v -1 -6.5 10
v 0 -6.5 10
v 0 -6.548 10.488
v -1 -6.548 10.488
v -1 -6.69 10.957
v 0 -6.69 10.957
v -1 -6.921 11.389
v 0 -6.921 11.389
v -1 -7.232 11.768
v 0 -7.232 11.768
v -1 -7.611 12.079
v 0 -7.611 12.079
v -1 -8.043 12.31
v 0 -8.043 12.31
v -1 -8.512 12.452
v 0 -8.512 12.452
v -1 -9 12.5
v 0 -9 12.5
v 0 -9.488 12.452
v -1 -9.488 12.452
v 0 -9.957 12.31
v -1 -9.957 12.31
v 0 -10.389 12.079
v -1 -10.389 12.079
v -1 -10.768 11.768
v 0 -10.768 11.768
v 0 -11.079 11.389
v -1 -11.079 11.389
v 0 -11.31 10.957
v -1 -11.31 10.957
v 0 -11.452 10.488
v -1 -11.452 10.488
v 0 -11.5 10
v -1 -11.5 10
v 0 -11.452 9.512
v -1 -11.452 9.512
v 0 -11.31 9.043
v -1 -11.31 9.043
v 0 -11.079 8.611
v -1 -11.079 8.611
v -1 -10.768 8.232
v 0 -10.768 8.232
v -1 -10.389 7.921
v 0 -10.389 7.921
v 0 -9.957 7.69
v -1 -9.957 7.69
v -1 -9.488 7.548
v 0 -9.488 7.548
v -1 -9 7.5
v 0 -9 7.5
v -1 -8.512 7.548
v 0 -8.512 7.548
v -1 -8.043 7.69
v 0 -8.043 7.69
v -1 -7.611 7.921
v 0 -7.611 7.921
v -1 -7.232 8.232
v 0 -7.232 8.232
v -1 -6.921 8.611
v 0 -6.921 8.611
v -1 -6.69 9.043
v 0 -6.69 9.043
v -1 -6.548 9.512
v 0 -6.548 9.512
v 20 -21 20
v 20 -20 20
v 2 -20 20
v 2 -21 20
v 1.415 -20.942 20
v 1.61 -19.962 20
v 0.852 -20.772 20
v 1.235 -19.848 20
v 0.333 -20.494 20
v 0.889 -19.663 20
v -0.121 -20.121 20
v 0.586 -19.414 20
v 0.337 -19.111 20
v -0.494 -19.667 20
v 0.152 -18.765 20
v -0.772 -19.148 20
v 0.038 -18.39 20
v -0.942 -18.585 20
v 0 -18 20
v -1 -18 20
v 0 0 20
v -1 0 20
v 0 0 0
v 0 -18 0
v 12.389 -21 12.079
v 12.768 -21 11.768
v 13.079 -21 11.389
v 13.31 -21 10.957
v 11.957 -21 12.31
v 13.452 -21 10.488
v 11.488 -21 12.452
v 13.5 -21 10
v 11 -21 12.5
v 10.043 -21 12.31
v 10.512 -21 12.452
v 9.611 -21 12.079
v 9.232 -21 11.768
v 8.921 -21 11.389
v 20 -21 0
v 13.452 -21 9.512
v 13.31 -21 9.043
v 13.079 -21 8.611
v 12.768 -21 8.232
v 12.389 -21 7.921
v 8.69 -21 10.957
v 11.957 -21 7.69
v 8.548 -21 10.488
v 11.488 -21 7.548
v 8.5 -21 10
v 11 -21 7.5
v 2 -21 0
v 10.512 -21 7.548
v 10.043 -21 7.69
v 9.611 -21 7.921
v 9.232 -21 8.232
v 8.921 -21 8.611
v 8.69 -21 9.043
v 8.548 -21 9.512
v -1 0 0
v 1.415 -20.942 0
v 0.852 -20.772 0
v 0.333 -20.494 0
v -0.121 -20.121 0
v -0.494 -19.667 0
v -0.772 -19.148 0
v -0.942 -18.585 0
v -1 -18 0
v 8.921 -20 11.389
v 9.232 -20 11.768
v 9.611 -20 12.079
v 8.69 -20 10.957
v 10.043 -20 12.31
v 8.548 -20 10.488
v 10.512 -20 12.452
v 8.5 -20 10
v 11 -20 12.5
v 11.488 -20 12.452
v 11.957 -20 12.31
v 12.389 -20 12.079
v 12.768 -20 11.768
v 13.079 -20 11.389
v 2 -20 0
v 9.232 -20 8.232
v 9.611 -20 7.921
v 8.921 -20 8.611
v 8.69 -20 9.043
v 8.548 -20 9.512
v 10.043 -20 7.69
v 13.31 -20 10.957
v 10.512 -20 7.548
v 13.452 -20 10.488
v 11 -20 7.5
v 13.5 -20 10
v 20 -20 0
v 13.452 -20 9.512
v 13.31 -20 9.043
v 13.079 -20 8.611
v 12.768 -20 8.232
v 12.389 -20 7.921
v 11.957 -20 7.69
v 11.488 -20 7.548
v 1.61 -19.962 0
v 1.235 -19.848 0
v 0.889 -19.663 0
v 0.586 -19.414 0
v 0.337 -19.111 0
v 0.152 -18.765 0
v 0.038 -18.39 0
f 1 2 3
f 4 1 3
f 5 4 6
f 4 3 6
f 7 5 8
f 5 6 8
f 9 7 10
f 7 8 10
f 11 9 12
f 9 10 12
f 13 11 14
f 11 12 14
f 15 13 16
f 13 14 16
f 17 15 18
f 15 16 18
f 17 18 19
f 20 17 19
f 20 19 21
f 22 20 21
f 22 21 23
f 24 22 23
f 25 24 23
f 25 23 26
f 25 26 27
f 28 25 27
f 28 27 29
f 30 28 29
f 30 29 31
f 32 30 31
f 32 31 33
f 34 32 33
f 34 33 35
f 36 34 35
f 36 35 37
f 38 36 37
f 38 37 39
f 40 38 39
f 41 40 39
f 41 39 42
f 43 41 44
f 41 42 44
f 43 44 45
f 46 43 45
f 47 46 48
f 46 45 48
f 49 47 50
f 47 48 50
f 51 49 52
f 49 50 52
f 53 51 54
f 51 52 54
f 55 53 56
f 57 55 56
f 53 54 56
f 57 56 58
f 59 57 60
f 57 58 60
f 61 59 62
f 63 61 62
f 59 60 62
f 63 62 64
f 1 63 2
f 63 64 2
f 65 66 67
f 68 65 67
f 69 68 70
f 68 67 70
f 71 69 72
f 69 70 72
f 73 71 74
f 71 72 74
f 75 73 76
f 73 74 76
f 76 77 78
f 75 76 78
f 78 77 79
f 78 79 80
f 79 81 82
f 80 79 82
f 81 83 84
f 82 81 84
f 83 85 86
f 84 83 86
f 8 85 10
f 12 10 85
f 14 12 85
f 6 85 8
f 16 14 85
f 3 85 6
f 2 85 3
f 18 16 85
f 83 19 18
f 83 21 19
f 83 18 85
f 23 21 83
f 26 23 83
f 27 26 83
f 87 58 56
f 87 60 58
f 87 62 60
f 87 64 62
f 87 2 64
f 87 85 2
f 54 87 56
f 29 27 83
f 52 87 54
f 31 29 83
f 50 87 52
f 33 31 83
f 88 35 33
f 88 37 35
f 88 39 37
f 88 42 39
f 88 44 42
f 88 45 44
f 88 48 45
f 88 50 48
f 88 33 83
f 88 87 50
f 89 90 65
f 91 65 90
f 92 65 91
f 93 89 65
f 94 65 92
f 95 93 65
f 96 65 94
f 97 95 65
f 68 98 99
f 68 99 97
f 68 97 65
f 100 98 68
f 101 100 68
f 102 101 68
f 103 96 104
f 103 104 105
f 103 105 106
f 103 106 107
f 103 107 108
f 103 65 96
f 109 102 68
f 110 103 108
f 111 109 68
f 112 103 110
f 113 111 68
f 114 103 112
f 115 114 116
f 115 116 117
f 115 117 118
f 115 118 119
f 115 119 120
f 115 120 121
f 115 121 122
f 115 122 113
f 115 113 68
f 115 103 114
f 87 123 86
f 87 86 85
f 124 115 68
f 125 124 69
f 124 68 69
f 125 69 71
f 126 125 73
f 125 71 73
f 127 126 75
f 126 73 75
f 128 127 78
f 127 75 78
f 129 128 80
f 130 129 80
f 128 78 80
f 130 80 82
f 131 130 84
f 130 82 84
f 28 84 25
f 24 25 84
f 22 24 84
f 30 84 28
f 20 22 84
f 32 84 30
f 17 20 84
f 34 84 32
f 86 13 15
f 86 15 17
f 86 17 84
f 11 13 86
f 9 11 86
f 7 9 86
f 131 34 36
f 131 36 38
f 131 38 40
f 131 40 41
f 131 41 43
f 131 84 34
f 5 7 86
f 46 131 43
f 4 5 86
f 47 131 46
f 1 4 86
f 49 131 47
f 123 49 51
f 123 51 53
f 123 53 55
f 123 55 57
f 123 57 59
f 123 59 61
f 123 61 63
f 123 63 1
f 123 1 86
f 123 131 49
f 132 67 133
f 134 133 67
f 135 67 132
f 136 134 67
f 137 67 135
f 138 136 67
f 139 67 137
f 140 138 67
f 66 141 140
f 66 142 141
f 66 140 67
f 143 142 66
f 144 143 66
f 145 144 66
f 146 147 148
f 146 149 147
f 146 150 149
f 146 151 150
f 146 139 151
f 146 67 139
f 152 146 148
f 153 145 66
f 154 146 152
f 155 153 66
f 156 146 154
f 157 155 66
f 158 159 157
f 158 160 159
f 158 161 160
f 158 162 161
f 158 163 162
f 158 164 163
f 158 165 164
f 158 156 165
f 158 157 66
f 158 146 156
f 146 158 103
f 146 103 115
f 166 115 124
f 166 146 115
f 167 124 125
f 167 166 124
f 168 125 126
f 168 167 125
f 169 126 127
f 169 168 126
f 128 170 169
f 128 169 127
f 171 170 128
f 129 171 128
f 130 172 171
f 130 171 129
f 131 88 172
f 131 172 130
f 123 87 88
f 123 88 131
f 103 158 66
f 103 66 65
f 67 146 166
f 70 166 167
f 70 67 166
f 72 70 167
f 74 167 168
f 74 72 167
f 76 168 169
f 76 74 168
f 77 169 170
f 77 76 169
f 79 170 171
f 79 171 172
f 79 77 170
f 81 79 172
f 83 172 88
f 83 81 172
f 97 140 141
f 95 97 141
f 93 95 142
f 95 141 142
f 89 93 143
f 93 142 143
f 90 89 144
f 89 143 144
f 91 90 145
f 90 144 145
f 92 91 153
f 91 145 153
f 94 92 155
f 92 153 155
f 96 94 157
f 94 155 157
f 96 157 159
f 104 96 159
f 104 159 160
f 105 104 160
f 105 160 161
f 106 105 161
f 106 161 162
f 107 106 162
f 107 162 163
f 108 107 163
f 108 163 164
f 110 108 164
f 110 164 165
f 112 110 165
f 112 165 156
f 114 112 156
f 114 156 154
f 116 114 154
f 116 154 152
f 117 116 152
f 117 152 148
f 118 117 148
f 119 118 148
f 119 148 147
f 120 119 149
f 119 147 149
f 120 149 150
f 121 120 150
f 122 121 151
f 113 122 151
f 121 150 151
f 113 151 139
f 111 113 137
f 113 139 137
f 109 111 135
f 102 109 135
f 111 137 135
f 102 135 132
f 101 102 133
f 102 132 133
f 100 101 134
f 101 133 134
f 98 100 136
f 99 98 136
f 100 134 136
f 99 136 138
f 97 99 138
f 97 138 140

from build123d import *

# Parameters (mm, degrees)
EXTRUDE_THIN1_DEPTH = 20
FILLET1_R           = 3
FILLET3_R           = 2
SKETCH3_R           = 2.5
CUT_EXTRUDE1_DEPTH  = 10
SKETCH4_R           = 2.5
CUT_EXTRUDE2_DEPTH  = 10


with BuildPart() as part:
    # Sketch1 → Extrude-Thin1 (new body)
    with BuildSketch(Plane.XY):
        Polygon((0, 0), (0, -20), (20, -20), (20, -21), (-1, -21), (-1, 0), align=None)
    extrude(amount=EXTRUDE_THIN1_DEPTH)

    # Fillet1
    fillet1_edges = [part.edges().sort_by_distance(p)[0] for p in [
        (-1, -21, 10),
    ]]
    fillet(fillet1_edges, radius=FILLET1_R)

    # Fillet3
    fillet3_edges = [part.edges().sort_by_distance(p)[0] for p in [
        (0, -20, 10),
    ]]
    fillet(fillet3_edges, radius=FILLET3_R)

    # Sketch3 → Cut-Extrude1 (cut)
    with BuildSketch(Plane(origin=(0, 0, 0), x_dir=(0, 0, -1), z_dir=(1, 0, 0))):
        with Locations(Location((-10, -9, 0), (0, 0, 90))):
            Circle(SKETCH3_R)
    extrude(amount=-CUT_EXTRUDE1_DEPTH, mode=Mode.SUBTRACT)

    # Sketch4 → Cut-Extrude2 (cut)
    with BuildSketch(Plane(origin=(0, -20, 0), x_dir=(1, 0, 0), z_dir=(0, 1, 0))):
        with Locations(Location((11, -10, 0), (0, 0, 270))):
            Circle(SKETCH4_R)
    extrude(amount=-CUT_EXTRUDE2_DEPTH, mode=Mode.SUBTRACT)


solid = part.part
